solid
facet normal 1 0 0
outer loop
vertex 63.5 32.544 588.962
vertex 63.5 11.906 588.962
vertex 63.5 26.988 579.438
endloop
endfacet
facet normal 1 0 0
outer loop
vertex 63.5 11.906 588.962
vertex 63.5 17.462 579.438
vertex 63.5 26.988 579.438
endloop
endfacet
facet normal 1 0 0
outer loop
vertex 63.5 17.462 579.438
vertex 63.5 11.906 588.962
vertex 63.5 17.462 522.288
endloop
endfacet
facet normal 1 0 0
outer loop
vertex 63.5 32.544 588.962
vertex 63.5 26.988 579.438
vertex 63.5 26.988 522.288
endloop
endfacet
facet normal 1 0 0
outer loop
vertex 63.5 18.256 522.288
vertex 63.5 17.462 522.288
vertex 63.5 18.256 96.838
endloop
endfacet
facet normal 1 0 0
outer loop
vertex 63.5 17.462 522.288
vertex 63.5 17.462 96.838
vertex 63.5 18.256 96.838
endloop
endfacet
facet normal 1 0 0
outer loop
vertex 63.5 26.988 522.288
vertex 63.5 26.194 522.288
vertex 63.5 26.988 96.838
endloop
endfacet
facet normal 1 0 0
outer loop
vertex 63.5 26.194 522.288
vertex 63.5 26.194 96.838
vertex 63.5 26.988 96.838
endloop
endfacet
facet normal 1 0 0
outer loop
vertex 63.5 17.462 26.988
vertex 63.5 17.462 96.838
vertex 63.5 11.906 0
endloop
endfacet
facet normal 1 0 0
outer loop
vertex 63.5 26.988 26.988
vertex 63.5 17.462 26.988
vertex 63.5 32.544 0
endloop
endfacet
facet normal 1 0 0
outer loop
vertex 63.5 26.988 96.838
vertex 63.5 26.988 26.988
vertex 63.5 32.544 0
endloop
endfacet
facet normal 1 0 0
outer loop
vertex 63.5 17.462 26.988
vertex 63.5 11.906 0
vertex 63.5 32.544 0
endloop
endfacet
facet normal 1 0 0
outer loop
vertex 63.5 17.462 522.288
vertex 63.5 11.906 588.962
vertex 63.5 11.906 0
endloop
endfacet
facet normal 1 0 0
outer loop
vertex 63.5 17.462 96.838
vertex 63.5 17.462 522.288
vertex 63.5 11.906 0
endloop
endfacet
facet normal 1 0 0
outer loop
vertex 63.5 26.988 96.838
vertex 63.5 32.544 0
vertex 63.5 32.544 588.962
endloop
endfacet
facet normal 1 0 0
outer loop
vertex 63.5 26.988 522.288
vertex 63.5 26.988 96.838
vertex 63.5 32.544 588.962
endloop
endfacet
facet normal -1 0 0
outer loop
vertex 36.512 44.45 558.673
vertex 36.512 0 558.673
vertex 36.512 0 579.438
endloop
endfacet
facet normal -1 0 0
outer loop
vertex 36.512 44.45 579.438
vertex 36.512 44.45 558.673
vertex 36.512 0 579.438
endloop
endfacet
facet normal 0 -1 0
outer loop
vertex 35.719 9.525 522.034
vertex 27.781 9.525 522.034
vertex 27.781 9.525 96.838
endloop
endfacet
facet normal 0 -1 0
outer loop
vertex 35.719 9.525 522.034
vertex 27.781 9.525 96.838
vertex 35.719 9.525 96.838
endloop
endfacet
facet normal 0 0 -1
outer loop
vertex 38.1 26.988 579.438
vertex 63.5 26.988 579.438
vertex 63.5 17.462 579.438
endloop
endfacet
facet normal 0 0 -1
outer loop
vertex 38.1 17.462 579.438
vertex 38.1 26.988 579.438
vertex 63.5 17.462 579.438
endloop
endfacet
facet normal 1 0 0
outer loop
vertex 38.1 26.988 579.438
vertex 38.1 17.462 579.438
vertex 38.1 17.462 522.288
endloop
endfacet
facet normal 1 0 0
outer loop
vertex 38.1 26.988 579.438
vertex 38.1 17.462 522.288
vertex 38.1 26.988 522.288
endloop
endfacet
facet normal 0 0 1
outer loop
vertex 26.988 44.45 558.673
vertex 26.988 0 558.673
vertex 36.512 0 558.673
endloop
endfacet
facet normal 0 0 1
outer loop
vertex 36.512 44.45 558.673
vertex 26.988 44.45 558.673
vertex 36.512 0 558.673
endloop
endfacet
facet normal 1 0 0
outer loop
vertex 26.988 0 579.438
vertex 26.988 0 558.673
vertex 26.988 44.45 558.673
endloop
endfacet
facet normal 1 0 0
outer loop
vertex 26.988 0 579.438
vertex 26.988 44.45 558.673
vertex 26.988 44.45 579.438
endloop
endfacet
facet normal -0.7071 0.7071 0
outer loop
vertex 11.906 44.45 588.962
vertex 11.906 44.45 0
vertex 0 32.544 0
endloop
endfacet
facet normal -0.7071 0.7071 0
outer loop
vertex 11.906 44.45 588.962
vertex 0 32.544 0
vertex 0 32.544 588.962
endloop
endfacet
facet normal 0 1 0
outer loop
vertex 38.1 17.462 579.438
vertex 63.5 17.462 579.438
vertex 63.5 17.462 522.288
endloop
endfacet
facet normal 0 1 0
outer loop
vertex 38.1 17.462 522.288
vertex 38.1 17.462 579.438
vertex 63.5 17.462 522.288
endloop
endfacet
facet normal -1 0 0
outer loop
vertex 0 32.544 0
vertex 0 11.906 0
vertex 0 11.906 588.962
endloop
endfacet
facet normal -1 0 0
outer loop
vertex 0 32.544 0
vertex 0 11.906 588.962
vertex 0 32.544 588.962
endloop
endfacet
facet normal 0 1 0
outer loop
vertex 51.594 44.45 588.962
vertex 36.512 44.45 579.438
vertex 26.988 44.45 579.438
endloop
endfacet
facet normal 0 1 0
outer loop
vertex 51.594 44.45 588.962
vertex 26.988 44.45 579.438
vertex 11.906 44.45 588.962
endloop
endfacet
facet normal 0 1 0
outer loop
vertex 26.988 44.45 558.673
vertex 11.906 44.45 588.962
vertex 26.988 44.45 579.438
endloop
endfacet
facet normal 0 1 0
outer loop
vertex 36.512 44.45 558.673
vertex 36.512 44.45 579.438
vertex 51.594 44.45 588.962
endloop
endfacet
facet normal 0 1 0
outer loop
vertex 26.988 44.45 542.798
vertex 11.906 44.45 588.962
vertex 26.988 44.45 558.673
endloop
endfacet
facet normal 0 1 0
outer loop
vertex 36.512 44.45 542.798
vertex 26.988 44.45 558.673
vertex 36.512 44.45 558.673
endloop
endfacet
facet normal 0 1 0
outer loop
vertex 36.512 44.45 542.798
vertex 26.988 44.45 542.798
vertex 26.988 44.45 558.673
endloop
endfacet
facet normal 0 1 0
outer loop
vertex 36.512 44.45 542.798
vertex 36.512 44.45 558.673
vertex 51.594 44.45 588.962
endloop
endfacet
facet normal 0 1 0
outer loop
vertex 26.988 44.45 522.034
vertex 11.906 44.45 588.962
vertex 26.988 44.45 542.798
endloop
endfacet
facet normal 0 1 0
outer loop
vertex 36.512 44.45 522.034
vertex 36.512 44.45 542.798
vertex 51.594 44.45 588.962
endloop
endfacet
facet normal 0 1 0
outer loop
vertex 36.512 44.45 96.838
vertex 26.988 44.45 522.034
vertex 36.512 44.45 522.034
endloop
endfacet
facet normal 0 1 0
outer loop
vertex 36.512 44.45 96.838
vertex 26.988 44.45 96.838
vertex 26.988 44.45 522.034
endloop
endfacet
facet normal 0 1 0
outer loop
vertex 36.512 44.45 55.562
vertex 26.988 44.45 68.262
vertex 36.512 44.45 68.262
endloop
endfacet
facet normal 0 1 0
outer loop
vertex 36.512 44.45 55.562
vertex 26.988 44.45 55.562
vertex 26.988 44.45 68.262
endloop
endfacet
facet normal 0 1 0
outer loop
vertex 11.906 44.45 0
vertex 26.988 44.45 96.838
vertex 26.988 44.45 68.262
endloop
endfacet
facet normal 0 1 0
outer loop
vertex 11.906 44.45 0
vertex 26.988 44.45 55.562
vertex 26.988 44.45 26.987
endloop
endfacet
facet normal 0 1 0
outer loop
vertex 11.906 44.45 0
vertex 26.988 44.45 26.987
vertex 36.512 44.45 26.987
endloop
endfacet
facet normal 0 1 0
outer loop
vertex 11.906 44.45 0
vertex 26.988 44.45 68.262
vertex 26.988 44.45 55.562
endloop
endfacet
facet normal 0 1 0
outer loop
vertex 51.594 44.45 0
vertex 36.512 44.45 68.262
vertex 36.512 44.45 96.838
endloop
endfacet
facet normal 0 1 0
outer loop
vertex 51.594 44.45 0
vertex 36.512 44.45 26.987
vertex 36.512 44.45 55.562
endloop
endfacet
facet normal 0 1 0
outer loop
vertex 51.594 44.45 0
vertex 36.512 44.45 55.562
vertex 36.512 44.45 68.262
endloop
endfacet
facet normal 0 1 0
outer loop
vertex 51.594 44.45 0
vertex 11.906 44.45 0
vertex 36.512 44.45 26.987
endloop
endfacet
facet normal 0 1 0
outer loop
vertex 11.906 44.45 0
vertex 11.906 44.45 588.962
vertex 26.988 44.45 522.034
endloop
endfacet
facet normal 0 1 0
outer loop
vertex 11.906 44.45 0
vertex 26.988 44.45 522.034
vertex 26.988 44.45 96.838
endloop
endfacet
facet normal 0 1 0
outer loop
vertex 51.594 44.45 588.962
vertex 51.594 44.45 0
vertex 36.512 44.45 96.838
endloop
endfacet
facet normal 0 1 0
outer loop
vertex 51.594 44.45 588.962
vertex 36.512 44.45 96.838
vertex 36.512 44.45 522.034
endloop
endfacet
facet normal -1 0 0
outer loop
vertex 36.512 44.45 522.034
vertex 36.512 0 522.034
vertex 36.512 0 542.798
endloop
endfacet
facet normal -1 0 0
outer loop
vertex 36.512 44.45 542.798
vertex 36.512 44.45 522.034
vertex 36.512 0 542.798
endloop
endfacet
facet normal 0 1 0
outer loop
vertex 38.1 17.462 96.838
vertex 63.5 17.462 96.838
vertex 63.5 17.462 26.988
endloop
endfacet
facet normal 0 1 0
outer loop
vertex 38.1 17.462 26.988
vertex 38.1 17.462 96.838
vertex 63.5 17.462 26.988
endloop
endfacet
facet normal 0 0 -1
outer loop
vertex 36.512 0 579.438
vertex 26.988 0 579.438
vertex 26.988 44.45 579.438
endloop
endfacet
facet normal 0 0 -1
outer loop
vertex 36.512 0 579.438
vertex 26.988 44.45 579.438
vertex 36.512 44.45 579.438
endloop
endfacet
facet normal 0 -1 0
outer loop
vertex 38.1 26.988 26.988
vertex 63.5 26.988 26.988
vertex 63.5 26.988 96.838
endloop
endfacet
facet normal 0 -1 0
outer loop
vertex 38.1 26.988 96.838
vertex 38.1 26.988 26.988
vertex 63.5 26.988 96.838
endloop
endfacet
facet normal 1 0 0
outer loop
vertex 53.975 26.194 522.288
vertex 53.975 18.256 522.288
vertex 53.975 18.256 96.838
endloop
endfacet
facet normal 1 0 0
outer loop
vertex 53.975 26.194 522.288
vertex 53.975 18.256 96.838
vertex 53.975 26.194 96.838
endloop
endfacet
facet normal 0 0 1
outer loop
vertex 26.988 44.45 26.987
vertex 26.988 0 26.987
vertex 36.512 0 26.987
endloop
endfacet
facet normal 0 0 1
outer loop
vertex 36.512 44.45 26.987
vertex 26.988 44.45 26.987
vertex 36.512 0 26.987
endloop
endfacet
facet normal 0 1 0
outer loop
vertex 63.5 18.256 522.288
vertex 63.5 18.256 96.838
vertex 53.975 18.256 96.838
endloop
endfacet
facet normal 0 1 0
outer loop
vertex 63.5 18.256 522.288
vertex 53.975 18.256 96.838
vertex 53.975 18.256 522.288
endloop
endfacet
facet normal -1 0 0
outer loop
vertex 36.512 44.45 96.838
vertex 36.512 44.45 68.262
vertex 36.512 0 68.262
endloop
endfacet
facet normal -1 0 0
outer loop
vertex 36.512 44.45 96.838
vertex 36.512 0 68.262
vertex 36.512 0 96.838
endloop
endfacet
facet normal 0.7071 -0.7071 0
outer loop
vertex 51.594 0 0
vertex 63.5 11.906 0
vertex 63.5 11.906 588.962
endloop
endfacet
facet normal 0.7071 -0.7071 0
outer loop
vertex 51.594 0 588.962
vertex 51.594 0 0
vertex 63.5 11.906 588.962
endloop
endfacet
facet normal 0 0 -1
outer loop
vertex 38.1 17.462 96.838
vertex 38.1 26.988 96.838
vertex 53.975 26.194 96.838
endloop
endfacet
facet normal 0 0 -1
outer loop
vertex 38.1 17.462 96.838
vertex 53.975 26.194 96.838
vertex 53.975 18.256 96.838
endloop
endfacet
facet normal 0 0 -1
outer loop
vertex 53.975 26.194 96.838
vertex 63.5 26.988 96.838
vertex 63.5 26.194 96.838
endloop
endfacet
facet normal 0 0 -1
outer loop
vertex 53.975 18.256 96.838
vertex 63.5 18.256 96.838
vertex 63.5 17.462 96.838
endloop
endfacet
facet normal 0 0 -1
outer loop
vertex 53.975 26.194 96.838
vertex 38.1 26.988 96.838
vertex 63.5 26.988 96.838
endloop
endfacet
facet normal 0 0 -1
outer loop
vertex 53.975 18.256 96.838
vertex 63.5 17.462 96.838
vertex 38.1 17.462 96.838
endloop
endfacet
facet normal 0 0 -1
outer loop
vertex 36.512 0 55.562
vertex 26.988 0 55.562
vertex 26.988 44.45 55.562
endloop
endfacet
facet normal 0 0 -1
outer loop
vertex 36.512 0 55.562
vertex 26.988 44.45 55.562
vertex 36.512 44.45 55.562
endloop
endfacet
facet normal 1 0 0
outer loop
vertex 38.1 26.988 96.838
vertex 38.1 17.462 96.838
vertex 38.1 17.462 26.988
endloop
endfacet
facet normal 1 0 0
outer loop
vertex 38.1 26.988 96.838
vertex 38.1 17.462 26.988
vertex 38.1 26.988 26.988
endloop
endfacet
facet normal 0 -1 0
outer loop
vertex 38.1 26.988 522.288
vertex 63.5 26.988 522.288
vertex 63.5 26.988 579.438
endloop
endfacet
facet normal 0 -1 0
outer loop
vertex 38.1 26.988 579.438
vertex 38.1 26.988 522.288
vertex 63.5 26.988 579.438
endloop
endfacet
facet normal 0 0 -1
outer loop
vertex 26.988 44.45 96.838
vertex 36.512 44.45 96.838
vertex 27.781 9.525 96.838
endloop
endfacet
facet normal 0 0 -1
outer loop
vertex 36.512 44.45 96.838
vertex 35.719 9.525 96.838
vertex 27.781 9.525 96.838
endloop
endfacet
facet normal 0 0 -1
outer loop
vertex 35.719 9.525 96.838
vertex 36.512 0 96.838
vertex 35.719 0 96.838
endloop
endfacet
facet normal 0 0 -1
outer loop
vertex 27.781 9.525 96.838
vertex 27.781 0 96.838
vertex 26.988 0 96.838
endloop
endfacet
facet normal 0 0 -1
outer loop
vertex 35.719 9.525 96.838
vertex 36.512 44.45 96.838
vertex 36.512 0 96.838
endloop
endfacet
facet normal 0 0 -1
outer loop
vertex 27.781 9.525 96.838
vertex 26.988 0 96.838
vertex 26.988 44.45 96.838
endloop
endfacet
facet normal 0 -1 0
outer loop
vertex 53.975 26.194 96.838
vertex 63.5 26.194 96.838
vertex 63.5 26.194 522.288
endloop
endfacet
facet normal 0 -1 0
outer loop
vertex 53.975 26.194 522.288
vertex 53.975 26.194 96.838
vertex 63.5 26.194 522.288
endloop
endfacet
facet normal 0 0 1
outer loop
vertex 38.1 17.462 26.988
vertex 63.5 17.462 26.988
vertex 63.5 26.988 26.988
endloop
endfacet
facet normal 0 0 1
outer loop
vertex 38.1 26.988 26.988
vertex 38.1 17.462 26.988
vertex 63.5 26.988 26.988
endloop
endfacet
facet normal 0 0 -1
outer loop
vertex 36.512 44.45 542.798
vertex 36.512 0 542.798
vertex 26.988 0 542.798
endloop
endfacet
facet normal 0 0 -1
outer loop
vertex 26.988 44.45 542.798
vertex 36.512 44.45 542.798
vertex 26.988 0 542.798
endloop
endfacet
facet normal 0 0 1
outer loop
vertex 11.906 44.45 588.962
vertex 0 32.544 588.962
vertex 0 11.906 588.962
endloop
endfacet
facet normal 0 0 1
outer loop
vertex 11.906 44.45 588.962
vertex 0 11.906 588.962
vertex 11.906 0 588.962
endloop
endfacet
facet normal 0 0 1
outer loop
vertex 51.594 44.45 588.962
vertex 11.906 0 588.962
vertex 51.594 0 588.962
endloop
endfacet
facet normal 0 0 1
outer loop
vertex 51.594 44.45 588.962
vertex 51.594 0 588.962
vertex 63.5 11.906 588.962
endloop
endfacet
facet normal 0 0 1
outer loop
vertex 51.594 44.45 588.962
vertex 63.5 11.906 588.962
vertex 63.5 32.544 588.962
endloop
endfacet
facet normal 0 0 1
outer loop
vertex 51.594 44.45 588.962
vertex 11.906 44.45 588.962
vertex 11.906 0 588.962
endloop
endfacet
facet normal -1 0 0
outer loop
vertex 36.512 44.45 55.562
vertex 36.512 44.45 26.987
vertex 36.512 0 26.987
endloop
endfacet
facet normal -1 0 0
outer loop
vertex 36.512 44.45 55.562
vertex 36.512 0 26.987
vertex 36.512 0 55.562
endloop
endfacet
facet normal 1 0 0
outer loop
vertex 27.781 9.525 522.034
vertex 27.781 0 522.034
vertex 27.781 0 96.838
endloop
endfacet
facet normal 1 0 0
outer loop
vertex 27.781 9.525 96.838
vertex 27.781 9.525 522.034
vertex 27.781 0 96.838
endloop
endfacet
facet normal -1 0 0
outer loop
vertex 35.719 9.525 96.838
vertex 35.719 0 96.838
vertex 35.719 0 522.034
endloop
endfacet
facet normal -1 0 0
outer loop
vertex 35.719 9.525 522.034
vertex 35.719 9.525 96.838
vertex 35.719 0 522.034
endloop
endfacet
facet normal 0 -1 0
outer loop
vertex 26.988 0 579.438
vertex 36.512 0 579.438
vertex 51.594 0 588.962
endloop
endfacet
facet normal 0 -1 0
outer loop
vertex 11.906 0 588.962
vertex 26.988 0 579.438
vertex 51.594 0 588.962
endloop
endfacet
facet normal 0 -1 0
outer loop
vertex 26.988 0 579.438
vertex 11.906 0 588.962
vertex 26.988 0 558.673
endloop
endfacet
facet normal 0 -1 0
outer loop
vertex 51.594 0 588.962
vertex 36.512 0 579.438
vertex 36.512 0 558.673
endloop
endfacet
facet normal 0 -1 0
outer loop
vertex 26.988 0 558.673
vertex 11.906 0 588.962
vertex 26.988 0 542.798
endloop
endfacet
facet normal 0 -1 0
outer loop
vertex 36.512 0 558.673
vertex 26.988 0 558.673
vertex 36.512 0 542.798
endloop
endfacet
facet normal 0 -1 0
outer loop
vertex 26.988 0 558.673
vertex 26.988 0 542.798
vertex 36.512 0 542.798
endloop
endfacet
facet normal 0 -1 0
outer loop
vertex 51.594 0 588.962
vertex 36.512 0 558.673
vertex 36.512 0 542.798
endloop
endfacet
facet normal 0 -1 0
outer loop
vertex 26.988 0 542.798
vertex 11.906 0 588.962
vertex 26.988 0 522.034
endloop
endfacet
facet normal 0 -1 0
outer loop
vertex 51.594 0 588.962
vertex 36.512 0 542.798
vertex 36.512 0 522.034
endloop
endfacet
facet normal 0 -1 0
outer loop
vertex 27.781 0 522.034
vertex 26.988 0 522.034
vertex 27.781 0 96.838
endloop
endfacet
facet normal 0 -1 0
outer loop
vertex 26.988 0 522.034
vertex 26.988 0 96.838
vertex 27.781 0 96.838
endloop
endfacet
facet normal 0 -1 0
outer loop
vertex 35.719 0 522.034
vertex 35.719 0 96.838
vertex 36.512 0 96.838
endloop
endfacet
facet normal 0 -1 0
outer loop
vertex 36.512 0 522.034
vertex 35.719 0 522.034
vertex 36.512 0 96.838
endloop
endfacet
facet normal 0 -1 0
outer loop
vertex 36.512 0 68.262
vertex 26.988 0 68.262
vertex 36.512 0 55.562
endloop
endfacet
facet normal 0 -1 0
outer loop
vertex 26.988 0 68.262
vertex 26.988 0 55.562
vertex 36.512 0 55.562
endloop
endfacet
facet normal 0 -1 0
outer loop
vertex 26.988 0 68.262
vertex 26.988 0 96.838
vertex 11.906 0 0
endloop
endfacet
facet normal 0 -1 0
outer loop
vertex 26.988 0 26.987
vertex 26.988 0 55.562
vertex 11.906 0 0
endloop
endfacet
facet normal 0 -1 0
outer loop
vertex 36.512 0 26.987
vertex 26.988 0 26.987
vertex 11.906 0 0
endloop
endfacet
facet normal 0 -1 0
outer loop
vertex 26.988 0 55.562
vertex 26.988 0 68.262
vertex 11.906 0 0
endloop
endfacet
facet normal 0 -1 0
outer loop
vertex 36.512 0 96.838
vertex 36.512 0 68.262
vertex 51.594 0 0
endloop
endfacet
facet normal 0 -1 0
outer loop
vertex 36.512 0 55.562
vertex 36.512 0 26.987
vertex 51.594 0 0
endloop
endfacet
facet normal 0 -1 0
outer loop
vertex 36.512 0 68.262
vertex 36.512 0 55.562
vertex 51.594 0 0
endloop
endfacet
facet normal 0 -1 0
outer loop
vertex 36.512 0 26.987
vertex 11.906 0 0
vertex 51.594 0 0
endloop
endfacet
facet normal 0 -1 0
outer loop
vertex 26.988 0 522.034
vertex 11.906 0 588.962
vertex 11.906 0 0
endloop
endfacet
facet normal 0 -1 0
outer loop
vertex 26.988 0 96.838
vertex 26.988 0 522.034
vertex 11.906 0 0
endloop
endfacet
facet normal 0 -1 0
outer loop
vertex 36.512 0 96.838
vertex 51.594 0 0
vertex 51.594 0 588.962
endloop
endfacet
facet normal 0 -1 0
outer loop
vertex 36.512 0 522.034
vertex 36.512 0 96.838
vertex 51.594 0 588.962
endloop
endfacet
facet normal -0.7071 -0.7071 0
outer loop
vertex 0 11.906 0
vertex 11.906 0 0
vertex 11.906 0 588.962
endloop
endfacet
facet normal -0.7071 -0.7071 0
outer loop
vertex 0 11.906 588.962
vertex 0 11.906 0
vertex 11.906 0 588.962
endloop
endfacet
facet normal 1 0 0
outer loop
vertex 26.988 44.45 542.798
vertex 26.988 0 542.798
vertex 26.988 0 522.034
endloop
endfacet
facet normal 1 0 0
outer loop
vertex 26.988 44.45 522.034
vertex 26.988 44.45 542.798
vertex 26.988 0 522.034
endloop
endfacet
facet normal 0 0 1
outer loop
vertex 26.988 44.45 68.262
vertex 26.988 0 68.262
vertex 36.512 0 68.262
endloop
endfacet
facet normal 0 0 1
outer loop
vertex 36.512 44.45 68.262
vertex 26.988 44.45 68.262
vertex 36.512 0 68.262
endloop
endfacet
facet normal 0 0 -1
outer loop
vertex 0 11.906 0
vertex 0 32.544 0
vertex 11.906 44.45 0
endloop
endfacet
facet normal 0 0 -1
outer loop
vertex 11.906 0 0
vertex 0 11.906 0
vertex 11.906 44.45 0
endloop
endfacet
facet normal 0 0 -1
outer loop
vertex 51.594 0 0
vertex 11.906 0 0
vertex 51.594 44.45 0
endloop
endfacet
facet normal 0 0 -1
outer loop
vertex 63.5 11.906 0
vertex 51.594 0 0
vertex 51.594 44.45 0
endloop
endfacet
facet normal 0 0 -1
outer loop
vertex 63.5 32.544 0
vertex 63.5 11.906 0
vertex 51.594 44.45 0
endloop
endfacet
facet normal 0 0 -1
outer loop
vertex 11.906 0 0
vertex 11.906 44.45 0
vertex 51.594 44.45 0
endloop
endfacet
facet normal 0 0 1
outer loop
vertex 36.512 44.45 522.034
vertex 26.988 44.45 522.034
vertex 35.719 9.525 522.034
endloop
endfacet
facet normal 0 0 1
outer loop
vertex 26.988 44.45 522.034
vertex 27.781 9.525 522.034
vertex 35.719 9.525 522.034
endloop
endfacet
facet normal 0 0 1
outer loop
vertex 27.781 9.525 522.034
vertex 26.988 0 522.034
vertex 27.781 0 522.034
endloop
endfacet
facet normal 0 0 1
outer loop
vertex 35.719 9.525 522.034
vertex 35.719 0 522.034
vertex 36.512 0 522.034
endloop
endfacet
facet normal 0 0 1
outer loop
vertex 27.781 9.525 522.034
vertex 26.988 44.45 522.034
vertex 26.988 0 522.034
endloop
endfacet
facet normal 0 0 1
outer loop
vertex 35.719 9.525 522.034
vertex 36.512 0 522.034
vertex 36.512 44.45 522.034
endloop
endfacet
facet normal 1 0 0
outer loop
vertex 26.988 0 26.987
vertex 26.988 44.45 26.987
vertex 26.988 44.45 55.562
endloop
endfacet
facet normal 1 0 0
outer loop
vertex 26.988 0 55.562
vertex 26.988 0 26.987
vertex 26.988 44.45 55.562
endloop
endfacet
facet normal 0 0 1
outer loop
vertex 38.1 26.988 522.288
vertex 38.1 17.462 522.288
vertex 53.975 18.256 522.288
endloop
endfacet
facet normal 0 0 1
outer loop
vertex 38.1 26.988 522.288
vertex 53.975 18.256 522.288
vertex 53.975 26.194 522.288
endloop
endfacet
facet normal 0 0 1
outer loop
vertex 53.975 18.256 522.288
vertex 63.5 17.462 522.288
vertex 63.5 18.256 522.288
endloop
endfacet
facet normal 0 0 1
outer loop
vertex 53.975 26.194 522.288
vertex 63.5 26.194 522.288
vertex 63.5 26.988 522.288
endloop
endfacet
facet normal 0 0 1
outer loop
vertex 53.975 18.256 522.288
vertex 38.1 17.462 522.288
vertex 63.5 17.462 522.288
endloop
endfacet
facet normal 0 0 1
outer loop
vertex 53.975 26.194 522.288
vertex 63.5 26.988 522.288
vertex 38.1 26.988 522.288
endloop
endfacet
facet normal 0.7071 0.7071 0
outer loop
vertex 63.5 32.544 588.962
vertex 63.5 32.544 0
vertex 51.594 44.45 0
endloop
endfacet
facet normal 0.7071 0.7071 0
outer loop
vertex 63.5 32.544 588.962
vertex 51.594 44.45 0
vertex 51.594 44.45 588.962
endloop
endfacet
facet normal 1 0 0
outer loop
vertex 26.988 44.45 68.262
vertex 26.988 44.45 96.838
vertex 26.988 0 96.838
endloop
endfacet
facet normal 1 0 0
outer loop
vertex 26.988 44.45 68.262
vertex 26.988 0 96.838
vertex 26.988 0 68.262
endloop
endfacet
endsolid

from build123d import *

# Parameters (mm, degrees)
F0_W     = 63.5
F0_H     = 44.45
F1_DEPTH = 588.9625
F3_DEPTH = 25.4
F2_W     = 7.9375
F2_H     = 425.45
F4_DEPTH = 9.525
F6_DEPTH = 9.525
F5_W     = 9.525
F5_H     = 20.7645
F5_H_2   = 28.575
F7_DEPTH = 44.451
F8_SIZE  = 11.90625


with BuildPart() as f1:
    # F0 (on Top) → F1 (new body)
    with BuildSketch(Plane.XY):
        with Locations((31.75, 22.225)):
            Rectangle(F0_W, F0_H)
    extrude(amount=F1_DEPTH)

    # F2 (on face) → F3 (cut)
    with BuildSketch(Plane.YZ.offset(63.5)):
        Polygon((26.9875, 579.4375), (17.4625, 579.4375), (17.4625, 522.2875), (18.25625, 522.2875), (26.19375, 522.2875), (26.9875, 522.2875), align=None)
        Polygon((26.19375, 96.8375), (18.25625, 96.8375), (17.4625, 96.8375), (17.4625, 26.9875), (26.9875, 26.9875), (26.9875, 96.8375), align=None)
    extrude(amount=-F3_DEPTH, mode=Mode.SUBTRACT)

    # F2 (on face) → F4 (cut)
    with BuildSketch(Plane.YZ.offset(63.5)):
        with Locations((22.225, 309.5625)):
            Rectangle(F2_W, F2_H)
    extrude(amount=-F4_DEPTH, mode=Mode.SUBTRACT)

    # F5 (on face) → F6 (cut)
    with BuildSketch(Plane.XZ):
        Polygon((35.71875, 522.0335), (28.575, 522.0335), (27.78125, 522.0335), (27.78125, 96.8375), (35.71875, 96.8375), align=None)
    extrude(amount=-F6_DEPTH, mode=Mode.SUBTRACT)

    # F5 (on face) → F7 (cut, through all)
    with BuildSketch(Plane.XZ):
        with Locations((31.75, 569.05525)):
            Rectangle(F5_W, F5_H)
        Polygon((27.78125, 522.0335), (28.575, 522.0335), (35.71875, 522.0335), (36.5125, 522.0335), (36.5125, 542.798), (26.9875, 542.798), (26.9875, 522.0335), align=None)
        Polygon((35.71875, 96.8375), (27.78125, 96.8375), (26.9875, 96.8375), (26.9875, 68.2625), (36.5125, 68.2625), (36.5125, 96.8375), align=None)
        with Locations((31.75, 41.275)):
            Rectangle(F5_W, F5_H_2)
    extrude(amount=-F7_DEPTH, mode=Mode.SUBTRACT)

    # F8
    f8_edges = [f1.edges().sort_by_distance(p)[0] for p in [
        (63.5, 44.45, 294.48125),
        (0, 44.45, 294.48125),
        (63.5, 0, 294.48125),
        (0, 0, 294.48125),
    ]]
    chamfer(f8_edges, length=F8_SIZE)


solid = f1.part
